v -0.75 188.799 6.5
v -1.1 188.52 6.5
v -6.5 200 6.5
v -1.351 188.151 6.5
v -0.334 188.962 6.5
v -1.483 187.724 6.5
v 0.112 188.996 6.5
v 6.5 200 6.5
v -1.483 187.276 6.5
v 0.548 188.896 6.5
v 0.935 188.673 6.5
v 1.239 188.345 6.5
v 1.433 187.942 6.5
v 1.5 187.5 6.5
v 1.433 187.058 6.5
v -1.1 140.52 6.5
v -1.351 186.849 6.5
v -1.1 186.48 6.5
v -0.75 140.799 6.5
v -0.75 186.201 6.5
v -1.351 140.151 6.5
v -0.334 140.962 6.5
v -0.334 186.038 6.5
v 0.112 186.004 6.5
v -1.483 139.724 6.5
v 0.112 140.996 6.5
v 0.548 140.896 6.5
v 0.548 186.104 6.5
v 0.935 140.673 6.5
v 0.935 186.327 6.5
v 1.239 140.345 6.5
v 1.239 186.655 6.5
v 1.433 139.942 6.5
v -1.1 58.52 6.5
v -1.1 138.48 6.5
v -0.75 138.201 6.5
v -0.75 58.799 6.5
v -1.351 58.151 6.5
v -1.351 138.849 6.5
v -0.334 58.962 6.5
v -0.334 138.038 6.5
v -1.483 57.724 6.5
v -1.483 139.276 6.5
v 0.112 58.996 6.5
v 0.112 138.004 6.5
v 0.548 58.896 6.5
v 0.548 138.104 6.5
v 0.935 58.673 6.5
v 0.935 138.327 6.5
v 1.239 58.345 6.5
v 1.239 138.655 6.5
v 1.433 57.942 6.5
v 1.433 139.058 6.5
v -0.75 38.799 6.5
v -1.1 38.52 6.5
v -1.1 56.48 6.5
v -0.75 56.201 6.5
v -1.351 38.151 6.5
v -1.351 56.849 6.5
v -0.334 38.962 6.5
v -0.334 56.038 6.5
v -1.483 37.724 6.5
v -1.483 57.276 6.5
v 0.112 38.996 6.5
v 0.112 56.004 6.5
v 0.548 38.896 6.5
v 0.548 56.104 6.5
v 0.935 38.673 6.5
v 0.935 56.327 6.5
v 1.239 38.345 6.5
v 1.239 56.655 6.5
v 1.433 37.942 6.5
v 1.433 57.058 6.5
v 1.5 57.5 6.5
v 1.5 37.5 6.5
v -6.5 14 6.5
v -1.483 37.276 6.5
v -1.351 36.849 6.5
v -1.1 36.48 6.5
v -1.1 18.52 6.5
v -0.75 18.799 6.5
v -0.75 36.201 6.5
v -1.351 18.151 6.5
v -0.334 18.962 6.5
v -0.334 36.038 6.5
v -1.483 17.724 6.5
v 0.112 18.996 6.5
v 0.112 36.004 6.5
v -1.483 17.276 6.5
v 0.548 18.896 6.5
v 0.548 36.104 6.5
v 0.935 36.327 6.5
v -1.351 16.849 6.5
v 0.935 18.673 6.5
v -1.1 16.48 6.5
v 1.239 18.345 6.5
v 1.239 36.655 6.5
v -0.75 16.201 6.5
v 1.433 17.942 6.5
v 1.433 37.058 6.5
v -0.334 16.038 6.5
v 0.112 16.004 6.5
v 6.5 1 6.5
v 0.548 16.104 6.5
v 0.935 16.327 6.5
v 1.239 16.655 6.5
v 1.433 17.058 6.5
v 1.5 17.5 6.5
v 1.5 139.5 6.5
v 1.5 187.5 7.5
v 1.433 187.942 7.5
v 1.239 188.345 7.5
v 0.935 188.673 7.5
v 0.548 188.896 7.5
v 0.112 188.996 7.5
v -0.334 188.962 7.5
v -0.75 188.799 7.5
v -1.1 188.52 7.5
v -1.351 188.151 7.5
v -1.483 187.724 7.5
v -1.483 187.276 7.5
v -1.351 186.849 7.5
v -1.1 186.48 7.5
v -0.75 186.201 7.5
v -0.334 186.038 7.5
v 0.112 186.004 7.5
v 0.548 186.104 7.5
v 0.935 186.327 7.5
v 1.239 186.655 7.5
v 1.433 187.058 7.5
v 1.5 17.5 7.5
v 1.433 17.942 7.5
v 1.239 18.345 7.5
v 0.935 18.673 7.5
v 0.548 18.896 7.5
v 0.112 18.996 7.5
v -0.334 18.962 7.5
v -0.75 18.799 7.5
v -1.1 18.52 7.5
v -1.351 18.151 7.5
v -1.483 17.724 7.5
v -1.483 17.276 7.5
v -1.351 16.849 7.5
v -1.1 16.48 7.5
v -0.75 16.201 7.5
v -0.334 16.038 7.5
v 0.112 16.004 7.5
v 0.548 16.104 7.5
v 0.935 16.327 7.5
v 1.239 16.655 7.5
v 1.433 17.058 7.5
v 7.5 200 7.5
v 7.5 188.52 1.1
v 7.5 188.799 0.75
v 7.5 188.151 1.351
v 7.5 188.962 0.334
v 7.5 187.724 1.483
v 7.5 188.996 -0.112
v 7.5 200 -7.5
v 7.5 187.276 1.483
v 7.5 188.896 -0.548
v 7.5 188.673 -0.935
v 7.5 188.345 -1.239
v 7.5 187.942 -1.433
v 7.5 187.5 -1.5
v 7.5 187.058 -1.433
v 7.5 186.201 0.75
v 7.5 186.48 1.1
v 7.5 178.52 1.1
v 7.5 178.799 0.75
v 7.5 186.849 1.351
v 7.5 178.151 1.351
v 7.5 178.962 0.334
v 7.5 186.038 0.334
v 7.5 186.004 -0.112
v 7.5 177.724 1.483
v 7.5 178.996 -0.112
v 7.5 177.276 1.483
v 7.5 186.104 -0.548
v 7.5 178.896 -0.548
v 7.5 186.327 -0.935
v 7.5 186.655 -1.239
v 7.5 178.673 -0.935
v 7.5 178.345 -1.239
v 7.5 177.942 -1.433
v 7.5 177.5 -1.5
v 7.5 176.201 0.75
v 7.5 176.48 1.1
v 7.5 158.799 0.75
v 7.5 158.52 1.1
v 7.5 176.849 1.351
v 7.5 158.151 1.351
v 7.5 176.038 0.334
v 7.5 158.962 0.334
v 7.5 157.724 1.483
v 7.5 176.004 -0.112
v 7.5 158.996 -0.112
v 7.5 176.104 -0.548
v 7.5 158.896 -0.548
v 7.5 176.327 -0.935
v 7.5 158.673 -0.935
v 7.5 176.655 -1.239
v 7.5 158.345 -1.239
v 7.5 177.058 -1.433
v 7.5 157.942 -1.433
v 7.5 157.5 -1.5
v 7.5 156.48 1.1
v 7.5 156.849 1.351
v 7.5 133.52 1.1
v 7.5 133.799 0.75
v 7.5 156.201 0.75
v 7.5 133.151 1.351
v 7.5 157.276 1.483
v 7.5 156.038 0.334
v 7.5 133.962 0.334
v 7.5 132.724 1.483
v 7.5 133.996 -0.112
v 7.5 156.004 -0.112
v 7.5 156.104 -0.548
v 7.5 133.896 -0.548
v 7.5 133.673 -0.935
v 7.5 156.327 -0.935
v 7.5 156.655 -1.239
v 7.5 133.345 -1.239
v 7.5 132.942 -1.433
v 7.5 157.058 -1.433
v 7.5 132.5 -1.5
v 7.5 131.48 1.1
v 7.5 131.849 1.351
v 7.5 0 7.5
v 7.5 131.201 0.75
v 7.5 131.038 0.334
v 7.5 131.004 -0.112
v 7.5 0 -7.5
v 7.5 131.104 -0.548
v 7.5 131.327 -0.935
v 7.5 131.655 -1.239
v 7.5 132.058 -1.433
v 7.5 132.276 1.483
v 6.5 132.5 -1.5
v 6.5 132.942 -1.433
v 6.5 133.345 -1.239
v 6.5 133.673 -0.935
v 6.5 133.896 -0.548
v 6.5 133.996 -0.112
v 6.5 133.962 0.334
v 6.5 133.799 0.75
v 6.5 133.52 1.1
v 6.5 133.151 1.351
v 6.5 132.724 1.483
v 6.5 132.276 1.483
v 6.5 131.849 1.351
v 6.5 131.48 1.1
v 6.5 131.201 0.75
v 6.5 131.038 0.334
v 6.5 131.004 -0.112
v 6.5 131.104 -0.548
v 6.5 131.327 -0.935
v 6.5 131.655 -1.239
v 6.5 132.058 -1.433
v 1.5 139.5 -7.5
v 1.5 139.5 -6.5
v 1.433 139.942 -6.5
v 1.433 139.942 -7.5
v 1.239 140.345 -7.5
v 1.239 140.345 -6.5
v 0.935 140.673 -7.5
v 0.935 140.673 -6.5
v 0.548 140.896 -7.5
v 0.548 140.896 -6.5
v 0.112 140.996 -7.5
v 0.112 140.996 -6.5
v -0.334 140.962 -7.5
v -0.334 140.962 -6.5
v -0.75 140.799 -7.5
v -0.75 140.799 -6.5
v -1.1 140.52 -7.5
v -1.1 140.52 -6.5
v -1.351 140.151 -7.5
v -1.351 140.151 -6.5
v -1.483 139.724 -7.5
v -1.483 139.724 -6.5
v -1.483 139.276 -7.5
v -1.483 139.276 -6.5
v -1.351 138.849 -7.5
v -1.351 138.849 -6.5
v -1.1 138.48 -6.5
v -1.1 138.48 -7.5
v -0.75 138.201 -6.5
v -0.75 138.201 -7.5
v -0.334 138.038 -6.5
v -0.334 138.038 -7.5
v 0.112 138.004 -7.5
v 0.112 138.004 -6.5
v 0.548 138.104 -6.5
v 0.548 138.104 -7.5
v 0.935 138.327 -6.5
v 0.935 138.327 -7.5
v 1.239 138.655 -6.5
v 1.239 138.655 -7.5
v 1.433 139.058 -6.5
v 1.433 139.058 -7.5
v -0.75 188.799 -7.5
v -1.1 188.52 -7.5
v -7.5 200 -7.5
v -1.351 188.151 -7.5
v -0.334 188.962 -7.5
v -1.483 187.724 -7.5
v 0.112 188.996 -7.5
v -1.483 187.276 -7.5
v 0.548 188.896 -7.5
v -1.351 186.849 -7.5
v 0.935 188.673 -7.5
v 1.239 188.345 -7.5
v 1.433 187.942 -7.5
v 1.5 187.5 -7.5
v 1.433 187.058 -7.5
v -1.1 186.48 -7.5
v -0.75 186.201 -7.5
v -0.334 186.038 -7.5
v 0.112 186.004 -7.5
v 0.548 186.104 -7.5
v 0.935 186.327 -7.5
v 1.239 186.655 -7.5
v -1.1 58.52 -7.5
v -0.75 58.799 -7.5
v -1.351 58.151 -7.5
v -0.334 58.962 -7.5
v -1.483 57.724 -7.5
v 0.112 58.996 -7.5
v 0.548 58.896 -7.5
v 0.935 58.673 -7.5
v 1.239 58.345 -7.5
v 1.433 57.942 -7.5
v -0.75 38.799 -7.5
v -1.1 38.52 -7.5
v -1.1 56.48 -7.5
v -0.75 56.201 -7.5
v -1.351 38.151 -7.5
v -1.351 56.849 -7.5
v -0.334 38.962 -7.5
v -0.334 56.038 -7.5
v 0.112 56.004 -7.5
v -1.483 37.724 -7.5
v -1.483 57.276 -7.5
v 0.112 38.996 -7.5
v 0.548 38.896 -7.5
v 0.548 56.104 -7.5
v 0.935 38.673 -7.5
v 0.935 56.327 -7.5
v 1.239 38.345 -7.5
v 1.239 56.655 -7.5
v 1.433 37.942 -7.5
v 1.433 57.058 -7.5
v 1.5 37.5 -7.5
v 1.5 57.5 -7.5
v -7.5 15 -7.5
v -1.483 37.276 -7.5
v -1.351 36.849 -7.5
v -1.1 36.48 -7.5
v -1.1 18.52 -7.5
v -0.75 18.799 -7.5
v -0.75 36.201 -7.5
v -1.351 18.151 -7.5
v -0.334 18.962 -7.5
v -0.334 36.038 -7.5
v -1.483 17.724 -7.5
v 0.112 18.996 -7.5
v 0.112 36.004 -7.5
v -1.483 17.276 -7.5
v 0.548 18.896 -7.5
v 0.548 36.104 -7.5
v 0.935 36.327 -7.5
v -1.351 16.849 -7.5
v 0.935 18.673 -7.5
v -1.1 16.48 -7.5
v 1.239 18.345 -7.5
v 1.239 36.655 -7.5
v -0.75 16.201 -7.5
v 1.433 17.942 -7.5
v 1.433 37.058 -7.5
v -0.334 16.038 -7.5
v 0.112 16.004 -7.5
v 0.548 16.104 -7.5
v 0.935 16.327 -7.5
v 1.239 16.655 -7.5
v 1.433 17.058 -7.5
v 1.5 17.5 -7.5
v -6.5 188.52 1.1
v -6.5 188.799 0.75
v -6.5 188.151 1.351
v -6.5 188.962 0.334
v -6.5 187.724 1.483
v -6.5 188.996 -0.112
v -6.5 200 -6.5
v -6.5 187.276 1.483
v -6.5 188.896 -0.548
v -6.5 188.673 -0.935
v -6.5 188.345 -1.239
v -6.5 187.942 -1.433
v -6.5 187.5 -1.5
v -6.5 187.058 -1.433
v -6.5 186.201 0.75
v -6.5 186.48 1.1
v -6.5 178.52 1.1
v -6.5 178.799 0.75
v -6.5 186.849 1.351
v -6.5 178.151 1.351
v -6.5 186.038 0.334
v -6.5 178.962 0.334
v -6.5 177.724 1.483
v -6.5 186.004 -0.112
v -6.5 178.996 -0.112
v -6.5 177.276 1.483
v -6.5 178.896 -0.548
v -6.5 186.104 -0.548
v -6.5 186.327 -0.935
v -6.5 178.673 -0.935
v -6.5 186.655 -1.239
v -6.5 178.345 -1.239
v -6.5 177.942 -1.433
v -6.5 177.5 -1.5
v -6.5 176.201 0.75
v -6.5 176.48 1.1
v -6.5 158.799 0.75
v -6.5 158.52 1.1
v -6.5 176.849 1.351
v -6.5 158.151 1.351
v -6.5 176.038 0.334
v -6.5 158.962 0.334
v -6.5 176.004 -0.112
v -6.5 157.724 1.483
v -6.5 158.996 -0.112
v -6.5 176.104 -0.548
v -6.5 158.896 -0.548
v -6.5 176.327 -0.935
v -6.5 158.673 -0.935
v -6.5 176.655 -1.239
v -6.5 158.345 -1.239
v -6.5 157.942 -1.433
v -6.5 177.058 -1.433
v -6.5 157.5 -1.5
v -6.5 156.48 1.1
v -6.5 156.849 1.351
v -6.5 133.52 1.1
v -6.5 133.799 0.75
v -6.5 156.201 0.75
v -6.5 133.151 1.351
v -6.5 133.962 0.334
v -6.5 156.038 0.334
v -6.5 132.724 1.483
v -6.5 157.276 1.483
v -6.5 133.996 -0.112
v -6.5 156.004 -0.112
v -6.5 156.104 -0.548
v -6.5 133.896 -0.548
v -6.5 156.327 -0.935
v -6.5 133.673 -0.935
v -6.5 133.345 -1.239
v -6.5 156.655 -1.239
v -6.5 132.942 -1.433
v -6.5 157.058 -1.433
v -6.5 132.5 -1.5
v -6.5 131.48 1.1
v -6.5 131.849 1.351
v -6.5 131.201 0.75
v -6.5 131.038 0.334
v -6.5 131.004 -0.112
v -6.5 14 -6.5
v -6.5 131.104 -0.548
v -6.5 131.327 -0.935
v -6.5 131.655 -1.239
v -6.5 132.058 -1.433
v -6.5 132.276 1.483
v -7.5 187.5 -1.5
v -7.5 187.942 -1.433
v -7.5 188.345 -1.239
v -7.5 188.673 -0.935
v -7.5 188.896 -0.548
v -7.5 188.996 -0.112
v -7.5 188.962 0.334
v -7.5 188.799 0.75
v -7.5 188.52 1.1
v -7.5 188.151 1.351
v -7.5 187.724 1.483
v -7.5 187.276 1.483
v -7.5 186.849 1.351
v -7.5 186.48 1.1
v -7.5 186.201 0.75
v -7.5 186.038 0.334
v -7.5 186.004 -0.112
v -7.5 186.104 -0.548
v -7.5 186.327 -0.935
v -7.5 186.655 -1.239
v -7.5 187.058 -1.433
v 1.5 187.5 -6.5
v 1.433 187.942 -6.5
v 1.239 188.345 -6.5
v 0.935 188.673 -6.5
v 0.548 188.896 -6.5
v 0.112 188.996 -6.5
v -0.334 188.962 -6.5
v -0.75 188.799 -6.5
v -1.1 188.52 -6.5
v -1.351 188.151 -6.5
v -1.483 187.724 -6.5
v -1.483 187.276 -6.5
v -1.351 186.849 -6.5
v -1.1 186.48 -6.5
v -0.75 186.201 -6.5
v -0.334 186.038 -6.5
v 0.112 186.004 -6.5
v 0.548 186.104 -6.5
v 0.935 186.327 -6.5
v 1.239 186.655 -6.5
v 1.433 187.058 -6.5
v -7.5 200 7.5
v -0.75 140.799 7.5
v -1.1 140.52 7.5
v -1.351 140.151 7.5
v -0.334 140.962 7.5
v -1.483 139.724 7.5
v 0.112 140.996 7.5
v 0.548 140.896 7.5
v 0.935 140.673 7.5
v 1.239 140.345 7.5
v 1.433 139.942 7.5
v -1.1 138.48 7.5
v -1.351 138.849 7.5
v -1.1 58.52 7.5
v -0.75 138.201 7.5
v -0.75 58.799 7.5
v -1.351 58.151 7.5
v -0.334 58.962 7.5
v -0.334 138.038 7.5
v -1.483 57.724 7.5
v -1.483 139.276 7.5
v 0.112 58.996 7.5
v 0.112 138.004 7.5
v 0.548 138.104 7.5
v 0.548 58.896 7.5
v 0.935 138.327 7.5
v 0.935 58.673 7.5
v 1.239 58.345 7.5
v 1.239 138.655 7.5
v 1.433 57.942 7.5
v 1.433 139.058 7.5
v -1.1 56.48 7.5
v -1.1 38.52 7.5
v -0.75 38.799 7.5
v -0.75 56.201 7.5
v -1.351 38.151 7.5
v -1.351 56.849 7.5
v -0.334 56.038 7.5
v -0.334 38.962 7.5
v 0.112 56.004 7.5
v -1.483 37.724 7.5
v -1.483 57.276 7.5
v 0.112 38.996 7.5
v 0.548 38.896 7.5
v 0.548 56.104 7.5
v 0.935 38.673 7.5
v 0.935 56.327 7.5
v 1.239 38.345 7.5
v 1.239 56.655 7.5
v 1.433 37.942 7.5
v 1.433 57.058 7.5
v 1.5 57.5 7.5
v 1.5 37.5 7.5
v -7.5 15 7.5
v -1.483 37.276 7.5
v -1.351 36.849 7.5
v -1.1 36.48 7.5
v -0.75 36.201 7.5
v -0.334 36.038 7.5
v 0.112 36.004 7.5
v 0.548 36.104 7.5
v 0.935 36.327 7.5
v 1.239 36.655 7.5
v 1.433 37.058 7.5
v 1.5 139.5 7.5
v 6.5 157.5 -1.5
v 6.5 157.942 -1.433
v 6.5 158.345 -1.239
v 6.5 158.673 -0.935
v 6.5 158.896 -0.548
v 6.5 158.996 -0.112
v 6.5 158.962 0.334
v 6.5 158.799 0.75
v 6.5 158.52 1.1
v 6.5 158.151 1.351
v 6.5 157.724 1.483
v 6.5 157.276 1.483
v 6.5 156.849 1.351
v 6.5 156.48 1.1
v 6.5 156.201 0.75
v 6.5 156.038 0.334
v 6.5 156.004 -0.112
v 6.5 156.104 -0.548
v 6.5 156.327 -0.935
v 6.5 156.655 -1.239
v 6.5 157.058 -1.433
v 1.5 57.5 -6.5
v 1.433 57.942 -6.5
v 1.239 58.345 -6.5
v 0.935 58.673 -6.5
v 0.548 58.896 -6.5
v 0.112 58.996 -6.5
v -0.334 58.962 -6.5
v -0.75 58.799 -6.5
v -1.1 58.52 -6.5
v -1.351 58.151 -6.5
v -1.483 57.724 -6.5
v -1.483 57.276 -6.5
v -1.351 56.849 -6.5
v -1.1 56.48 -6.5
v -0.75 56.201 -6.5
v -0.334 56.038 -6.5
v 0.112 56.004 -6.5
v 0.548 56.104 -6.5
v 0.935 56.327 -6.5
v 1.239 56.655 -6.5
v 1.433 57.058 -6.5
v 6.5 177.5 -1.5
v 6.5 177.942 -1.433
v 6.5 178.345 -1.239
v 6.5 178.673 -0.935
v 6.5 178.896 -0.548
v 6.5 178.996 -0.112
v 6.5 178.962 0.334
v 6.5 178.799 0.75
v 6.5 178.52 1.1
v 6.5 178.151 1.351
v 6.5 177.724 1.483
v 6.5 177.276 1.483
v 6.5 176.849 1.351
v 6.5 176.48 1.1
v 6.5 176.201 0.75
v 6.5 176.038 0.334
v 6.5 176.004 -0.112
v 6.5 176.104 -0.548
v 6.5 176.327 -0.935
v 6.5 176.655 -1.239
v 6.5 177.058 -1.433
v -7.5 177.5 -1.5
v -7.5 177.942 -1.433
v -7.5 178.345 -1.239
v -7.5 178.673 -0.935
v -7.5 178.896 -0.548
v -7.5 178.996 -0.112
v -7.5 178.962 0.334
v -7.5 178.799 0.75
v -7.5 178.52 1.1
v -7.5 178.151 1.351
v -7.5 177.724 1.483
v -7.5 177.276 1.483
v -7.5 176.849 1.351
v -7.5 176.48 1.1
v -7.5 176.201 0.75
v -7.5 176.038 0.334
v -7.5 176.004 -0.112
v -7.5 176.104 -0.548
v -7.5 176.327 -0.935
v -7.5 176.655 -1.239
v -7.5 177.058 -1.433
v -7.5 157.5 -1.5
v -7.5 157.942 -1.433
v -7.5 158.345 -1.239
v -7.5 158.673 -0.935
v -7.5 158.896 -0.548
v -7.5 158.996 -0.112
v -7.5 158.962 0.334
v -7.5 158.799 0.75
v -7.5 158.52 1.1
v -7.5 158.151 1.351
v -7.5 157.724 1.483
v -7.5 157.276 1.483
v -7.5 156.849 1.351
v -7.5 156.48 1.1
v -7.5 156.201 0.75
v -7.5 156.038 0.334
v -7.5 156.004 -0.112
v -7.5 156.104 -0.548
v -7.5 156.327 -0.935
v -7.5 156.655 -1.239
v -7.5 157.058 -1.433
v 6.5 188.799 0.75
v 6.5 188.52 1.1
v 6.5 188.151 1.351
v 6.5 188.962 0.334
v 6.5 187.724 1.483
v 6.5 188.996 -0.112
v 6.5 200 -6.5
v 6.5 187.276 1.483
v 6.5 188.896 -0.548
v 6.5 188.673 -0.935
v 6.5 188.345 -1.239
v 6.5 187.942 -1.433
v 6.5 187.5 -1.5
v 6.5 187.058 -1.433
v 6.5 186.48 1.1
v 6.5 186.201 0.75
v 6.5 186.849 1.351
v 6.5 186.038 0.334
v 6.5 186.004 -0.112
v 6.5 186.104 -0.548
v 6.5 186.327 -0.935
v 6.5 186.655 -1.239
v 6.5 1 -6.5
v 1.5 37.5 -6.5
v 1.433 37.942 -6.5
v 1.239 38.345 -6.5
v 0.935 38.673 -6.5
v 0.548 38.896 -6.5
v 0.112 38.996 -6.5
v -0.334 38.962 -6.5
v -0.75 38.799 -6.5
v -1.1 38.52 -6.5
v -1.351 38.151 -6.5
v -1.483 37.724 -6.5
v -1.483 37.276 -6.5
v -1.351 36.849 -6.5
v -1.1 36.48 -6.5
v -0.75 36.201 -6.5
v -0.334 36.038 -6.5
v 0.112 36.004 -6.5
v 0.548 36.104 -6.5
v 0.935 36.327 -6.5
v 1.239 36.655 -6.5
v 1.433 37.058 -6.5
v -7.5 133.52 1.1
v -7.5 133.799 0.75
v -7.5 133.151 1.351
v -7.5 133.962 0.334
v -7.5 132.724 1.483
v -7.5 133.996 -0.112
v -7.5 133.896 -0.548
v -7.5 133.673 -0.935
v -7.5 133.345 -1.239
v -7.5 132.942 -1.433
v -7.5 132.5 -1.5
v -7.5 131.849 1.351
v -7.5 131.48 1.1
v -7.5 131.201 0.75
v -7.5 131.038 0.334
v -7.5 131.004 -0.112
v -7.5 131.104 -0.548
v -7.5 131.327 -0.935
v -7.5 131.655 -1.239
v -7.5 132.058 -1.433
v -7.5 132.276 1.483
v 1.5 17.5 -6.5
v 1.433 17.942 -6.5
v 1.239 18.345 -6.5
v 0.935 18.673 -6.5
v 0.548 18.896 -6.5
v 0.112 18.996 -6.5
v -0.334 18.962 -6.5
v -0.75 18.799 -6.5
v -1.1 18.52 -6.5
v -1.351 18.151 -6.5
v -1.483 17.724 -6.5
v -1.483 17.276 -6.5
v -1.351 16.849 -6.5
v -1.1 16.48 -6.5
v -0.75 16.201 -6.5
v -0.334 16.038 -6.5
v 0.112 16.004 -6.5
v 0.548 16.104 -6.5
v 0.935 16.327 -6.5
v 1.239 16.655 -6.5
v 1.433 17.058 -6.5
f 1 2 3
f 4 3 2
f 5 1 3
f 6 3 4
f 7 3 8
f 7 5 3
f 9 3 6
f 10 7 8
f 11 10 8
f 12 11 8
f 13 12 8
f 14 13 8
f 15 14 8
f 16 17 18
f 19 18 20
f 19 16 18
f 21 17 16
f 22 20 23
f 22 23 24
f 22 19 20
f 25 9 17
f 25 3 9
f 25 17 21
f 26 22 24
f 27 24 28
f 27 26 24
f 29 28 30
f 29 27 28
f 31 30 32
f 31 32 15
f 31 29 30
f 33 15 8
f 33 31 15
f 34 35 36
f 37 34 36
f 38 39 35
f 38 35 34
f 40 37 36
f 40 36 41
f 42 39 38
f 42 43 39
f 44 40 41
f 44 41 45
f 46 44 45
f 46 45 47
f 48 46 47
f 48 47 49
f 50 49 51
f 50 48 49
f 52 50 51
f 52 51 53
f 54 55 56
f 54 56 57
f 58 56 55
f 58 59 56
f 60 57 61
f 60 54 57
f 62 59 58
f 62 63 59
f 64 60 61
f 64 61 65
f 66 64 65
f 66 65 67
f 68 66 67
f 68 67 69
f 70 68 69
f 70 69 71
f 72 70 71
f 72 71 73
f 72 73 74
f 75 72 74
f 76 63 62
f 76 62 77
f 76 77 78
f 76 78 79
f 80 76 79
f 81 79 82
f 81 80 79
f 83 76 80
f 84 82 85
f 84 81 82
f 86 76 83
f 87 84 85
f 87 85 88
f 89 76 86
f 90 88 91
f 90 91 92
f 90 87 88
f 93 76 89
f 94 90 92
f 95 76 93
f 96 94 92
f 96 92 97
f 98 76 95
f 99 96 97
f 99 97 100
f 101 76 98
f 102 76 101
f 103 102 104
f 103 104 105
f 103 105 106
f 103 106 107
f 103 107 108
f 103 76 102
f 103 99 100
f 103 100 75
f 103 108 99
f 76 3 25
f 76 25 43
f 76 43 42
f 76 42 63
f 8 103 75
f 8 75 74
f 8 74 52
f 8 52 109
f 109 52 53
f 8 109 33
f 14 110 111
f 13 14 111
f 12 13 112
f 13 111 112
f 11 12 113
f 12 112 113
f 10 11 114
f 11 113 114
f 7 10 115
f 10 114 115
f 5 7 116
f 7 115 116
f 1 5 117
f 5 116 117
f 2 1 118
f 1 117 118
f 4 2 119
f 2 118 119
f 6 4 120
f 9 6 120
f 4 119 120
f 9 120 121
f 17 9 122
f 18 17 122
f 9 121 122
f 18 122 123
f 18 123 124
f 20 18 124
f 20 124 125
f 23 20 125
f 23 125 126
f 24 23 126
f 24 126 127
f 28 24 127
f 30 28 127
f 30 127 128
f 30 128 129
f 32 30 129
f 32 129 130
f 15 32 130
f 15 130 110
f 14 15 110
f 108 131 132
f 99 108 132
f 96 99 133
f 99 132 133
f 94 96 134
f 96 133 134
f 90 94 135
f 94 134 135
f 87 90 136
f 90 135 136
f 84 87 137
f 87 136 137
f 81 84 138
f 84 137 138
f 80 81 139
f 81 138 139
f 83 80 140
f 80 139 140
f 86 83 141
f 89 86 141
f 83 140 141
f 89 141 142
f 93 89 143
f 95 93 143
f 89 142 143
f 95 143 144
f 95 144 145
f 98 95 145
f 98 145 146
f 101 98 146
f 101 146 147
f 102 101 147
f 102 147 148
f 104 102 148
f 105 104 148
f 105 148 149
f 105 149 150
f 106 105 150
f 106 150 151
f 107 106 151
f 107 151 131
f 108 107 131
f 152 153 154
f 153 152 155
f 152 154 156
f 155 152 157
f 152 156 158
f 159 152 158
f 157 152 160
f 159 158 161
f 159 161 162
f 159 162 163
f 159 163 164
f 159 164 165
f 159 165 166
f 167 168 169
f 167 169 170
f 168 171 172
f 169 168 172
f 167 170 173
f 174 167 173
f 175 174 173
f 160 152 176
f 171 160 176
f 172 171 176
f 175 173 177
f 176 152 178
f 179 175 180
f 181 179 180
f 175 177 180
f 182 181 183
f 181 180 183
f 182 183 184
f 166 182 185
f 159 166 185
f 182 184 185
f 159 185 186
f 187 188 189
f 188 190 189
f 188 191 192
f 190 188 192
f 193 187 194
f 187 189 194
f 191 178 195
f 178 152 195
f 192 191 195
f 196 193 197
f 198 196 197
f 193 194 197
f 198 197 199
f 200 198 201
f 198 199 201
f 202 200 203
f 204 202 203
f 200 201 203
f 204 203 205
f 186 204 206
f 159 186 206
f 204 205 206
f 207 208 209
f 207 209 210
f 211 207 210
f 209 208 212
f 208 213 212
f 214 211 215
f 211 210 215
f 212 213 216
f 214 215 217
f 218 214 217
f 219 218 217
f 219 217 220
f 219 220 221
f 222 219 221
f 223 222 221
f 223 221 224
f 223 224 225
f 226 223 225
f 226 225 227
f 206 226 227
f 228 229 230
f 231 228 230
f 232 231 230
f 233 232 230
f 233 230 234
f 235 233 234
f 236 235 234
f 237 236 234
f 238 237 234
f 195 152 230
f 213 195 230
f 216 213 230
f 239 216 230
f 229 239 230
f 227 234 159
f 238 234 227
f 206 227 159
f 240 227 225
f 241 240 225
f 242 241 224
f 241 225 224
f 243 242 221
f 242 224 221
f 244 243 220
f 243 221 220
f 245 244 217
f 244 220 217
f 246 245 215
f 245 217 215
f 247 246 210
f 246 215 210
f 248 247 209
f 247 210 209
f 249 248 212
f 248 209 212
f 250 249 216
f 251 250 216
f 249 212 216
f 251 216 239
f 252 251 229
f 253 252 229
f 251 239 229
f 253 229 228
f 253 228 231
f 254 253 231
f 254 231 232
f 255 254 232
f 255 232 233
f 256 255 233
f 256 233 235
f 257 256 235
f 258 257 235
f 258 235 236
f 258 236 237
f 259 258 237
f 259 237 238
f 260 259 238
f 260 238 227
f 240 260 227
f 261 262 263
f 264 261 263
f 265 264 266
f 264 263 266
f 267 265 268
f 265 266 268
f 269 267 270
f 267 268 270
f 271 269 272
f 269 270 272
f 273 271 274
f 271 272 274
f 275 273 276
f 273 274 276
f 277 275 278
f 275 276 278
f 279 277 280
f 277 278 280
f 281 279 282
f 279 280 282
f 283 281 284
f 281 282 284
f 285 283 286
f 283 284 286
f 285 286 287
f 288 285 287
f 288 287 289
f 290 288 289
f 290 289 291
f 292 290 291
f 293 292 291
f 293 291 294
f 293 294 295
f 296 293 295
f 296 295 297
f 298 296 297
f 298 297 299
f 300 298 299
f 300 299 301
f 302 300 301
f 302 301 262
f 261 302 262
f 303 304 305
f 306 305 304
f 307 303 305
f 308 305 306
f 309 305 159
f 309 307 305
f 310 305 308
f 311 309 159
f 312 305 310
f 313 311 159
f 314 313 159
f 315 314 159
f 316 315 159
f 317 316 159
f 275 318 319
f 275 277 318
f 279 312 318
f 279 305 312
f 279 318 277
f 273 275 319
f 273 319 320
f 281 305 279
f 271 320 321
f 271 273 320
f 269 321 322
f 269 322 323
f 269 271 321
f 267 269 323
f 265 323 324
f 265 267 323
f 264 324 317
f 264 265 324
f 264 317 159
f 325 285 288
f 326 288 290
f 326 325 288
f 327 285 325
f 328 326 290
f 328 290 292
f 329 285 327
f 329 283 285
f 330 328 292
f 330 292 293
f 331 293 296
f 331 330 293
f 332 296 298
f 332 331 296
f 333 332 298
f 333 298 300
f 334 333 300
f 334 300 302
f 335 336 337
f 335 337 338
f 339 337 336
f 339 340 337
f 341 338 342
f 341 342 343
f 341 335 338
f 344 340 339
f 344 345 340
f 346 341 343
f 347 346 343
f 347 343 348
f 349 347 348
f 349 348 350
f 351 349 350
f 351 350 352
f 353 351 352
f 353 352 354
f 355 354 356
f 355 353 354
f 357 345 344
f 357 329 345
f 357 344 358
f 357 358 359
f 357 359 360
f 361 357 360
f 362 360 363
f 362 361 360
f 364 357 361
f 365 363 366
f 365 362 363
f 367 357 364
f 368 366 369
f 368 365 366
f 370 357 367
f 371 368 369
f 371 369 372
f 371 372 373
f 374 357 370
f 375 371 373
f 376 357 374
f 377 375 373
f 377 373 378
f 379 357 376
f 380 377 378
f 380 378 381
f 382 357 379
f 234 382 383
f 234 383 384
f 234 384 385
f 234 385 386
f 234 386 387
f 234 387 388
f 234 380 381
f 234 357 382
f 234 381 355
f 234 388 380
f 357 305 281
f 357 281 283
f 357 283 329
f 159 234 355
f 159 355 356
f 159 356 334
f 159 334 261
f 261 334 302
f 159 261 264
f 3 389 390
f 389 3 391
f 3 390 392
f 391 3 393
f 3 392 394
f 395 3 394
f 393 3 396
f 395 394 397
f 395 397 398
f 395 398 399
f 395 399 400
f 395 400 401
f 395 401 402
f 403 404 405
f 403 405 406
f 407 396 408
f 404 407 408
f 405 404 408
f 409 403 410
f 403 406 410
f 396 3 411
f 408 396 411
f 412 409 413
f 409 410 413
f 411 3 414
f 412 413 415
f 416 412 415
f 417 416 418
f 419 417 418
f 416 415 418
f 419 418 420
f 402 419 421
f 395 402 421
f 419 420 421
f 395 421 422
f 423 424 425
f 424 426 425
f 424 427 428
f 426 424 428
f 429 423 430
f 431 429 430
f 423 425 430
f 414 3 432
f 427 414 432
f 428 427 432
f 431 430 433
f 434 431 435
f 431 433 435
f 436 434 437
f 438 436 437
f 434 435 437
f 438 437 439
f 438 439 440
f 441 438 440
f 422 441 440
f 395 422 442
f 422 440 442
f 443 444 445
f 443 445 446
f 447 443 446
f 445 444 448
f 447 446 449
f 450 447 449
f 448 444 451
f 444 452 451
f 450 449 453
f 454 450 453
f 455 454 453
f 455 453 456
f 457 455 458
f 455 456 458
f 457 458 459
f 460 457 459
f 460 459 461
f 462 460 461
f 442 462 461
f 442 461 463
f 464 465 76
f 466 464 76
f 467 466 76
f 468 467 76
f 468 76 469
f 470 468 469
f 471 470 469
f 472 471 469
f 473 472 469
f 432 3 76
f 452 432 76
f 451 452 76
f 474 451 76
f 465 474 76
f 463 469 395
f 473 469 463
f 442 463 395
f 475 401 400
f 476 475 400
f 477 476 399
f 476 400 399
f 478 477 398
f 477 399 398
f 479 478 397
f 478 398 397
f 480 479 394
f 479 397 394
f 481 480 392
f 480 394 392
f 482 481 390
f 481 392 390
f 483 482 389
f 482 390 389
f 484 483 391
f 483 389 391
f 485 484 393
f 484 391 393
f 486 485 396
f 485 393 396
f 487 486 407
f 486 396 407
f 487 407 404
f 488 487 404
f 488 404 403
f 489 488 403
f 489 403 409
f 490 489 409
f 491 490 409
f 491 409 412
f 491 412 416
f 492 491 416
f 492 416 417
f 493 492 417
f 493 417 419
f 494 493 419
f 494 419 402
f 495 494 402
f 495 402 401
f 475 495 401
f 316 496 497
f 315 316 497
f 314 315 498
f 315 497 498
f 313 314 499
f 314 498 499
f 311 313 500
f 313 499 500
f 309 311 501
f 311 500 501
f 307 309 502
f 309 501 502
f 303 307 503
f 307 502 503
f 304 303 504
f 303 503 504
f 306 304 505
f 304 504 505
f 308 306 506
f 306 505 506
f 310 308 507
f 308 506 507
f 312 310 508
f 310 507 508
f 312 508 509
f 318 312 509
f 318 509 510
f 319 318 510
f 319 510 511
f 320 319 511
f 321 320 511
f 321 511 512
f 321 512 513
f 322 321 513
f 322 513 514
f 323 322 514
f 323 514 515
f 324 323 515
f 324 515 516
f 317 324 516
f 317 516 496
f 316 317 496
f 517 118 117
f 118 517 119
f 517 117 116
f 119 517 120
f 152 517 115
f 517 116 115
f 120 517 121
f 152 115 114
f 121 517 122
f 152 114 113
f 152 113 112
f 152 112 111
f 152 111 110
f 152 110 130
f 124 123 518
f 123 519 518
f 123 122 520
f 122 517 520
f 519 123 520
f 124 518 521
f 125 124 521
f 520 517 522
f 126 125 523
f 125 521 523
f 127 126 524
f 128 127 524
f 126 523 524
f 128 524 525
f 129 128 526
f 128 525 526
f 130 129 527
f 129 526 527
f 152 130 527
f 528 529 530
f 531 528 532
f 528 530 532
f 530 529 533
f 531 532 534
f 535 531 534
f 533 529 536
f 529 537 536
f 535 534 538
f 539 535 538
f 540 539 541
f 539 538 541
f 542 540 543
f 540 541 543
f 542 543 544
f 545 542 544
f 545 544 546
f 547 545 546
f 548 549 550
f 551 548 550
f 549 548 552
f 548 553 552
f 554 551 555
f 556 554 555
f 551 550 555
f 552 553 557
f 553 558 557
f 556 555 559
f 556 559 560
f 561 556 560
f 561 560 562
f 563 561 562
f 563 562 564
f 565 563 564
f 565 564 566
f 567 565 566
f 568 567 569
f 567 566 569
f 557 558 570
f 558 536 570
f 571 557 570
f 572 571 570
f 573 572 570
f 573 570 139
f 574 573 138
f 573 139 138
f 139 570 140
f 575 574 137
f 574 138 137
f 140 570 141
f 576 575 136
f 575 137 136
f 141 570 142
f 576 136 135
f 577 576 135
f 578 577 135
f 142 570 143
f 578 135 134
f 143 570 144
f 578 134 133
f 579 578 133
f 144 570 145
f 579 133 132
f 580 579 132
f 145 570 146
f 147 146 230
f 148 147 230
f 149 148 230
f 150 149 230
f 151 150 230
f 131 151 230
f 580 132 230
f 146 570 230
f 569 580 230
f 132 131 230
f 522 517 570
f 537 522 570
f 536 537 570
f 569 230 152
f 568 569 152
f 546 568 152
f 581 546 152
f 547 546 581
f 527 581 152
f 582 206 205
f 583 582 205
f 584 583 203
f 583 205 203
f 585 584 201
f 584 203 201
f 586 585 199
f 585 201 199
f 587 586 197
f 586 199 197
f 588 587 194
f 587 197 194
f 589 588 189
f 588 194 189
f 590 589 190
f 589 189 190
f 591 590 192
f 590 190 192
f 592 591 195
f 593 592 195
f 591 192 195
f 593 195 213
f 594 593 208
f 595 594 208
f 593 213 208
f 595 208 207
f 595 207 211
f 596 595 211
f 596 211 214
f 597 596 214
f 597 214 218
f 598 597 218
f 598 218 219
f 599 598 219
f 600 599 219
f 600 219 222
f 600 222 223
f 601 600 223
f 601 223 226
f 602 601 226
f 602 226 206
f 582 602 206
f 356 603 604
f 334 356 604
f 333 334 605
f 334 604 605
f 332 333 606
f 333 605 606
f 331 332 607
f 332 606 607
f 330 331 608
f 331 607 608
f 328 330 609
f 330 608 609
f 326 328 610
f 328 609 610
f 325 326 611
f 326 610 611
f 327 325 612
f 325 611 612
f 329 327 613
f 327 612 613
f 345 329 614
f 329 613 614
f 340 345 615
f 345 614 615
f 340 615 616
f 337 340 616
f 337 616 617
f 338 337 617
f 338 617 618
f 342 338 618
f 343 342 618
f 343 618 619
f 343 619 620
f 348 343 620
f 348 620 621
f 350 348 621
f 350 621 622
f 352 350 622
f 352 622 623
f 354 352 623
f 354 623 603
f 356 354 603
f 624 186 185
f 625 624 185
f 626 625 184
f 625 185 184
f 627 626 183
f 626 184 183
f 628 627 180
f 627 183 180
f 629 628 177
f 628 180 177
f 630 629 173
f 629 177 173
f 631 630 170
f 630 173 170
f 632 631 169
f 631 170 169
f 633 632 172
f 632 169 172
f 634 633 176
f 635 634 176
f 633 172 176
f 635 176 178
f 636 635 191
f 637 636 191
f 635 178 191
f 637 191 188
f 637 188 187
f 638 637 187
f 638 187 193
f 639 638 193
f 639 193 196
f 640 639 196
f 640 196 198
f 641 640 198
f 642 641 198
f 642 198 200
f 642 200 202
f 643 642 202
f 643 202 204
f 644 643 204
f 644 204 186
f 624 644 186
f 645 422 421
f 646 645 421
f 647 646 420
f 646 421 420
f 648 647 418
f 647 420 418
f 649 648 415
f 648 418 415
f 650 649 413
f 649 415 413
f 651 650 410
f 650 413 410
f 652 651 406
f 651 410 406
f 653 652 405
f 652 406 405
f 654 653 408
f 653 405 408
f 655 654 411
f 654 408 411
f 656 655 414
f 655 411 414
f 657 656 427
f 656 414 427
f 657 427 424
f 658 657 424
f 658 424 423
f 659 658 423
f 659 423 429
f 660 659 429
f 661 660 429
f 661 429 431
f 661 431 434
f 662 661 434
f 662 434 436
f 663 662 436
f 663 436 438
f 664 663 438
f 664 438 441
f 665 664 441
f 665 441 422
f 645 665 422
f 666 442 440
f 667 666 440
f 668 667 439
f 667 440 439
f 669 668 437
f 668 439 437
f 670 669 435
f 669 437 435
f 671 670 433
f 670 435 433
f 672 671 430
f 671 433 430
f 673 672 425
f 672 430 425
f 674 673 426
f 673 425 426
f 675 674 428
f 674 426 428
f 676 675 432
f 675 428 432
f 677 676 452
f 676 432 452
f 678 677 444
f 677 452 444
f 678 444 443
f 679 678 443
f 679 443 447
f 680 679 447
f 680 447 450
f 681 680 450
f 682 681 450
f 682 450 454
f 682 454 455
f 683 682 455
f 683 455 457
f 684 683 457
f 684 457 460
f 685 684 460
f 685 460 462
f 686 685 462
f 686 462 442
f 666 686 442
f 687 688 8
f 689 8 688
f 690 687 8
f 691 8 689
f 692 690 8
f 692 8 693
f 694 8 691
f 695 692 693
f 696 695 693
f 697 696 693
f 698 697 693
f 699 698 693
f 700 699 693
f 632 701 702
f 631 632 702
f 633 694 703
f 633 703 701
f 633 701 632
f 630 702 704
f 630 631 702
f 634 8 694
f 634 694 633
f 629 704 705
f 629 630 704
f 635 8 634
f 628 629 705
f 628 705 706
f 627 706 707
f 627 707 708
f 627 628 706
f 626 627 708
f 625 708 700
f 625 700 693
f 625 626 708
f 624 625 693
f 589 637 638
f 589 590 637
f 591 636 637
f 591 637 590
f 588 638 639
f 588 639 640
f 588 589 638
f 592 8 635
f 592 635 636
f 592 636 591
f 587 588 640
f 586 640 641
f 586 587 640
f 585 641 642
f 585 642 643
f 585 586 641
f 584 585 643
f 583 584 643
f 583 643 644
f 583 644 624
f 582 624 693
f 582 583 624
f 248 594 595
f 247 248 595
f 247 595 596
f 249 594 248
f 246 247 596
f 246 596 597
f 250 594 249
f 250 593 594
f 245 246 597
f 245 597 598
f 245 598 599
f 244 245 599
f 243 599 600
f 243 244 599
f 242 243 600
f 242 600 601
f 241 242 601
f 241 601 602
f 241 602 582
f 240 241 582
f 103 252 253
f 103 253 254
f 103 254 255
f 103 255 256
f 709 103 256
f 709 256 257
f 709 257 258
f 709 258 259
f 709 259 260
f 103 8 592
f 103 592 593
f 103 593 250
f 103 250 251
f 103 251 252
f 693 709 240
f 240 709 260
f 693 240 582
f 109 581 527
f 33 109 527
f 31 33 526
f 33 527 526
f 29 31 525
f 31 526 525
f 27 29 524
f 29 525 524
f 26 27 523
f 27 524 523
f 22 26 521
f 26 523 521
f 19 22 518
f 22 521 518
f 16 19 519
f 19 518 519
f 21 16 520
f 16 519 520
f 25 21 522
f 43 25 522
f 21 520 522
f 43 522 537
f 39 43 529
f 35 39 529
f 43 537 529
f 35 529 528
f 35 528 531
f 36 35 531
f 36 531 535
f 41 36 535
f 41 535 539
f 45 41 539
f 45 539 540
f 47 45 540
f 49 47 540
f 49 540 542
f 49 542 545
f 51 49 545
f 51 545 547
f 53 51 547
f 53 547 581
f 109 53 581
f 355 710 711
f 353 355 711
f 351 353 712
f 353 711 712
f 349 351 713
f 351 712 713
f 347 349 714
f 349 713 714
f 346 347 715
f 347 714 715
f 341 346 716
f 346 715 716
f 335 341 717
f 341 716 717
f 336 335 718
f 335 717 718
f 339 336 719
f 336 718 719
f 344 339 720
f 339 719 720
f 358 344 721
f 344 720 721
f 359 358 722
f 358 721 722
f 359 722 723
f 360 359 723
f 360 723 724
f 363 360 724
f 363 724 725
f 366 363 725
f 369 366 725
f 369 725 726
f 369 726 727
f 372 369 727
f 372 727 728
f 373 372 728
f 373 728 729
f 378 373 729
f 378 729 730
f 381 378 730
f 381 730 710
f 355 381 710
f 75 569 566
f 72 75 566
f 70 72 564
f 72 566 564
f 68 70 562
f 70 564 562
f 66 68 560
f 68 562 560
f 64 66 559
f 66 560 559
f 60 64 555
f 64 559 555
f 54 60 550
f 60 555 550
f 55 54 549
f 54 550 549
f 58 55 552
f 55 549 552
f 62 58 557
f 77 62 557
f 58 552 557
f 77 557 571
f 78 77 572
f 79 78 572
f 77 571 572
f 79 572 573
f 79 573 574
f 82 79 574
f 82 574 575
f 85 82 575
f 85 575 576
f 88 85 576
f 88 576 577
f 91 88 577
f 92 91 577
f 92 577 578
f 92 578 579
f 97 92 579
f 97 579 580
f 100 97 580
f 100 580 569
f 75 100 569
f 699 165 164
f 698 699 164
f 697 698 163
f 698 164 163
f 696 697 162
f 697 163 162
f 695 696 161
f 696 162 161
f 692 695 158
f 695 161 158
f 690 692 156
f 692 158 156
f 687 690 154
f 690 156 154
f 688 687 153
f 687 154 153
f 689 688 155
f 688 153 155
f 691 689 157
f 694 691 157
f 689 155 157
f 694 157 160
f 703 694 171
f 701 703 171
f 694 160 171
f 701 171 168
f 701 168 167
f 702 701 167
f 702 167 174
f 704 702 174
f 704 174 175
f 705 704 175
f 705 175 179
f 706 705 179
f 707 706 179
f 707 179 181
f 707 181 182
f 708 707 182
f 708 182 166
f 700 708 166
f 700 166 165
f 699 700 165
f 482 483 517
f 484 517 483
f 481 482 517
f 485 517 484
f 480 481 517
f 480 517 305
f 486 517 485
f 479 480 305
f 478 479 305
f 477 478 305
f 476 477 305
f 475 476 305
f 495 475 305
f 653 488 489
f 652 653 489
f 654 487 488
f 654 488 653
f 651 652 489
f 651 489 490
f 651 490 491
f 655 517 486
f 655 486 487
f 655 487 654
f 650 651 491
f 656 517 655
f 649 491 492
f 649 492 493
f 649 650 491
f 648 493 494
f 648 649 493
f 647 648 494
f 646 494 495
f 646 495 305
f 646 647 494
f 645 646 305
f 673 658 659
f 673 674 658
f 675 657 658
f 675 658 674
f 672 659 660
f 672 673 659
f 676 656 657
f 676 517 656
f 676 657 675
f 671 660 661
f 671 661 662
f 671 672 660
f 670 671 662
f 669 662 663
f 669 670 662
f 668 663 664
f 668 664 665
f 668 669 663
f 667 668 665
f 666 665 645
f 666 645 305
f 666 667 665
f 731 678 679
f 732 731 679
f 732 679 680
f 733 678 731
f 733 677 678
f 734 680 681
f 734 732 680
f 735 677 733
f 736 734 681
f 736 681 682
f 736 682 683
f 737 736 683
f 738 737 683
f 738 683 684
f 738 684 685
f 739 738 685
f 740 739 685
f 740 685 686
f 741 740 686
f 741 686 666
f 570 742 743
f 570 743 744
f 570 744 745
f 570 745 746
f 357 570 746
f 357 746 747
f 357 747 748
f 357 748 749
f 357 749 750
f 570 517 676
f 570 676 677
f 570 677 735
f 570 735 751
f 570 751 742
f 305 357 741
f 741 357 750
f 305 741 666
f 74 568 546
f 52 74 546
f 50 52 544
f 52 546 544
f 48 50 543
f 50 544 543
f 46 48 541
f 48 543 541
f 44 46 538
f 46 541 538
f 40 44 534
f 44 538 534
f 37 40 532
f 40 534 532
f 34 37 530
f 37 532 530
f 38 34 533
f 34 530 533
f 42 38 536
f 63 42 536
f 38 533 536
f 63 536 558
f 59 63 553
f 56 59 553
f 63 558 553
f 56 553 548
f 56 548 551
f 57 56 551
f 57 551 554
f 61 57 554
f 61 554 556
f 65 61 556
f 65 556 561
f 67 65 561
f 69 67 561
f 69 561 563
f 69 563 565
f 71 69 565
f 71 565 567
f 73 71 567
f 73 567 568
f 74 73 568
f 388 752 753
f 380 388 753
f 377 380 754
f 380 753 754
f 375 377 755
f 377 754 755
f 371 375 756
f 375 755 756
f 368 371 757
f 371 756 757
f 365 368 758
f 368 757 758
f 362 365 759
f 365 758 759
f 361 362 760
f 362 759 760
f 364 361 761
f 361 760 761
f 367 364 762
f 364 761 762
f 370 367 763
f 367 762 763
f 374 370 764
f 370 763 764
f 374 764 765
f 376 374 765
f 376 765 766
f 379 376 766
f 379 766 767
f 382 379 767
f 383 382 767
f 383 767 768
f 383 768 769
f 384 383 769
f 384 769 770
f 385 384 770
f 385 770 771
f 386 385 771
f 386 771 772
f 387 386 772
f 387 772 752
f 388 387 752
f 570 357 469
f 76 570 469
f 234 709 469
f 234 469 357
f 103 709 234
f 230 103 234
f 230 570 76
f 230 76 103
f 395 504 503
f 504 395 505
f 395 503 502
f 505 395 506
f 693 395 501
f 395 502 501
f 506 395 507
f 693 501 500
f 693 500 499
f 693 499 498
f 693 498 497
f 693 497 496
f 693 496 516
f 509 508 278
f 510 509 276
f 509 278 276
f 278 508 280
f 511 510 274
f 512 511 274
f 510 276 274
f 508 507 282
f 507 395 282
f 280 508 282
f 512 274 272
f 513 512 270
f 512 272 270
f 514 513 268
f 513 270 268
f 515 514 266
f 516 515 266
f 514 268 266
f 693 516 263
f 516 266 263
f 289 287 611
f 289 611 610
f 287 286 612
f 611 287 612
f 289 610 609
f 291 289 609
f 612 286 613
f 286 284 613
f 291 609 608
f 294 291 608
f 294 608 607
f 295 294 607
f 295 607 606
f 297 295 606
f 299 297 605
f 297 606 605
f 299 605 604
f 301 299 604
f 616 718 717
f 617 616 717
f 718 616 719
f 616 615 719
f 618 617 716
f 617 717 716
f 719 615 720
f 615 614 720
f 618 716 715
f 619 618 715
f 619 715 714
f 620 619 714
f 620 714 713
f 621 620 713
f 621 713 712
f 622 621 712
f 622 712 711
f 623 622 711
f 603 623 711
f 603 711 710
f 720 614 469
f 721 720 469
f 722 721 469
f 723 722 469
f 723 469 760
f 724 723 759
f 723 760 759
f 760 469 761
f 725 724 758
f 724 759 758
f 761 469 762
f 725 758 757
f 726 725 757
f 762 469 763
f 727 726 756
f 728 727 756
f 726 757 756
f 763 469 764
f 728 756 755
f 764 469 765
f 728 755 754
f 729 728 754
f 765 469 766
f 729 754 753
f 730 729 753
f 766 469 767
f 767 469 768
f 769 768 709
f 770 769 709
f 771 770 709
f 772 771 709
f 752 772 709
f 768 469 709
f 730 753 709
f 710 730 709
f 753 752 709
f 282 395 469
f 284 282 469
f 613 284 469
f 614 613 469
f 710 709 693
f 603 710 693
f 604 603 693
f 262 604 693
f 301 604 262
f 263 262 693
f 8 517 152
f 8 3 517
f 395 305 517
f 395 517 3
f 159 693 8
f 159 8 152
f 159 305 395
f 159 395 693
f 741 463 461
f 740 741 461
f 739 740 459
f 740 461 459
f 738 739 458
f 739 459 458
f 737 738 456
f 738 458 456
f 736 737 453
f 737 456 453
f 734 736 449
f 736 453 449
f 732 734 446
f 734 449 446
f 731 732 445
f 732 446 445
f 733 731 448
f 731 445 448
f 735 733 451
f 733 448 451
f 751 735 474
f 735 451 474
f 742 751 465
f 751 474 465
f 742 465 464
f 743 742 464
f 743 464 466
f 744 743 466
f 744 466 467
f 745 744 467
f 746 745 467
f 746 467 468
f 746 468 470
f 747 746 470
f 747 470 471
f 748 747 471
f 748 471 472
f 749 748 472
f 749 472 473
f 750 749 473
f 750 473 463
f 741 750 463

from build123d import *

# Parameters (mm, degrees)
SKETCH_1_W          = 15
SKETCH_1_H          = 15
SKETCH_1_W_2        = 13
SKETCH_1_H_2        = 13
EXTRUDE_1_DEPTH     = 200
SKETCH_2_R          = 1.5
CUT_EXTRUDE_1_DEPTH = 201.701893364
SKETCH_3_R          = 1.5
CUT_EXTRUDE_2_DEPTH = 201.701893364


with BuildPart() as part:
    # 草图1 → 凸台-拉伸1 (new body)
    with BuildSketch(Plane(origin=(0, 0, 0), x_dir=(1, 0, 0), z_dir=(0, 1, 0))):
        Rectangle(SKETCH_1_W, SKETCH_1_H)
        Rectangle(SKETCH_1_W_2, SKETCH_1_H_2, mode=Mode.SUBTRACT)
    extrude(amount=EXTRUDE_1_DEPTH)

    # 草图2 → 切除-拉伸1 (cut, through all)
    with BuildSketch(Plane.XY.offset(7.5)):
        with Locations((0, 37.5)):
            Circle(SKETCH_2_R)
        with Locations((0, 17.5)):
            Circle(SKETCH_2_R)
        with Locations((0, 57.5)):
            Circle(SKETCH_2_R)
        with Locations((0, 187.5)):
            Circle(SKETCH_2_R)
        with Locations((0, 139.5)):
            Circle(SKETCH_2_R)
        Polygon((7.5, 0), (-7.5, 0), (-7.5, 15), align=None)
    extrude(amount=-CUT_EXTRUDE_1_DEPTH, mode=Mode.SUBTRACT)

    # 草图3 → 切除-拉伸2 (cut, through all)
    with BuildSketch(Plane(origin=(7.5, 0, 0), x_dir=(0, 0, -1), z_dir=(1, 0, 0))):
        with Locations((0, 157.5)):
            Circle(SKETCH_3_R)
        with Locations((0, 177.5)):
            Circle(SKETCH_3_R)
        with Locations((0, 132.5)):
            Circle(SKETCH_3_R)
        with Locations((0, 187.5)):
            Circle(SKETCH_3_R)
    extrude(amount=-CUT_EXTRUDE_2_DEPTH, mode=Mode.SUBTRACT)


solid = part.part
